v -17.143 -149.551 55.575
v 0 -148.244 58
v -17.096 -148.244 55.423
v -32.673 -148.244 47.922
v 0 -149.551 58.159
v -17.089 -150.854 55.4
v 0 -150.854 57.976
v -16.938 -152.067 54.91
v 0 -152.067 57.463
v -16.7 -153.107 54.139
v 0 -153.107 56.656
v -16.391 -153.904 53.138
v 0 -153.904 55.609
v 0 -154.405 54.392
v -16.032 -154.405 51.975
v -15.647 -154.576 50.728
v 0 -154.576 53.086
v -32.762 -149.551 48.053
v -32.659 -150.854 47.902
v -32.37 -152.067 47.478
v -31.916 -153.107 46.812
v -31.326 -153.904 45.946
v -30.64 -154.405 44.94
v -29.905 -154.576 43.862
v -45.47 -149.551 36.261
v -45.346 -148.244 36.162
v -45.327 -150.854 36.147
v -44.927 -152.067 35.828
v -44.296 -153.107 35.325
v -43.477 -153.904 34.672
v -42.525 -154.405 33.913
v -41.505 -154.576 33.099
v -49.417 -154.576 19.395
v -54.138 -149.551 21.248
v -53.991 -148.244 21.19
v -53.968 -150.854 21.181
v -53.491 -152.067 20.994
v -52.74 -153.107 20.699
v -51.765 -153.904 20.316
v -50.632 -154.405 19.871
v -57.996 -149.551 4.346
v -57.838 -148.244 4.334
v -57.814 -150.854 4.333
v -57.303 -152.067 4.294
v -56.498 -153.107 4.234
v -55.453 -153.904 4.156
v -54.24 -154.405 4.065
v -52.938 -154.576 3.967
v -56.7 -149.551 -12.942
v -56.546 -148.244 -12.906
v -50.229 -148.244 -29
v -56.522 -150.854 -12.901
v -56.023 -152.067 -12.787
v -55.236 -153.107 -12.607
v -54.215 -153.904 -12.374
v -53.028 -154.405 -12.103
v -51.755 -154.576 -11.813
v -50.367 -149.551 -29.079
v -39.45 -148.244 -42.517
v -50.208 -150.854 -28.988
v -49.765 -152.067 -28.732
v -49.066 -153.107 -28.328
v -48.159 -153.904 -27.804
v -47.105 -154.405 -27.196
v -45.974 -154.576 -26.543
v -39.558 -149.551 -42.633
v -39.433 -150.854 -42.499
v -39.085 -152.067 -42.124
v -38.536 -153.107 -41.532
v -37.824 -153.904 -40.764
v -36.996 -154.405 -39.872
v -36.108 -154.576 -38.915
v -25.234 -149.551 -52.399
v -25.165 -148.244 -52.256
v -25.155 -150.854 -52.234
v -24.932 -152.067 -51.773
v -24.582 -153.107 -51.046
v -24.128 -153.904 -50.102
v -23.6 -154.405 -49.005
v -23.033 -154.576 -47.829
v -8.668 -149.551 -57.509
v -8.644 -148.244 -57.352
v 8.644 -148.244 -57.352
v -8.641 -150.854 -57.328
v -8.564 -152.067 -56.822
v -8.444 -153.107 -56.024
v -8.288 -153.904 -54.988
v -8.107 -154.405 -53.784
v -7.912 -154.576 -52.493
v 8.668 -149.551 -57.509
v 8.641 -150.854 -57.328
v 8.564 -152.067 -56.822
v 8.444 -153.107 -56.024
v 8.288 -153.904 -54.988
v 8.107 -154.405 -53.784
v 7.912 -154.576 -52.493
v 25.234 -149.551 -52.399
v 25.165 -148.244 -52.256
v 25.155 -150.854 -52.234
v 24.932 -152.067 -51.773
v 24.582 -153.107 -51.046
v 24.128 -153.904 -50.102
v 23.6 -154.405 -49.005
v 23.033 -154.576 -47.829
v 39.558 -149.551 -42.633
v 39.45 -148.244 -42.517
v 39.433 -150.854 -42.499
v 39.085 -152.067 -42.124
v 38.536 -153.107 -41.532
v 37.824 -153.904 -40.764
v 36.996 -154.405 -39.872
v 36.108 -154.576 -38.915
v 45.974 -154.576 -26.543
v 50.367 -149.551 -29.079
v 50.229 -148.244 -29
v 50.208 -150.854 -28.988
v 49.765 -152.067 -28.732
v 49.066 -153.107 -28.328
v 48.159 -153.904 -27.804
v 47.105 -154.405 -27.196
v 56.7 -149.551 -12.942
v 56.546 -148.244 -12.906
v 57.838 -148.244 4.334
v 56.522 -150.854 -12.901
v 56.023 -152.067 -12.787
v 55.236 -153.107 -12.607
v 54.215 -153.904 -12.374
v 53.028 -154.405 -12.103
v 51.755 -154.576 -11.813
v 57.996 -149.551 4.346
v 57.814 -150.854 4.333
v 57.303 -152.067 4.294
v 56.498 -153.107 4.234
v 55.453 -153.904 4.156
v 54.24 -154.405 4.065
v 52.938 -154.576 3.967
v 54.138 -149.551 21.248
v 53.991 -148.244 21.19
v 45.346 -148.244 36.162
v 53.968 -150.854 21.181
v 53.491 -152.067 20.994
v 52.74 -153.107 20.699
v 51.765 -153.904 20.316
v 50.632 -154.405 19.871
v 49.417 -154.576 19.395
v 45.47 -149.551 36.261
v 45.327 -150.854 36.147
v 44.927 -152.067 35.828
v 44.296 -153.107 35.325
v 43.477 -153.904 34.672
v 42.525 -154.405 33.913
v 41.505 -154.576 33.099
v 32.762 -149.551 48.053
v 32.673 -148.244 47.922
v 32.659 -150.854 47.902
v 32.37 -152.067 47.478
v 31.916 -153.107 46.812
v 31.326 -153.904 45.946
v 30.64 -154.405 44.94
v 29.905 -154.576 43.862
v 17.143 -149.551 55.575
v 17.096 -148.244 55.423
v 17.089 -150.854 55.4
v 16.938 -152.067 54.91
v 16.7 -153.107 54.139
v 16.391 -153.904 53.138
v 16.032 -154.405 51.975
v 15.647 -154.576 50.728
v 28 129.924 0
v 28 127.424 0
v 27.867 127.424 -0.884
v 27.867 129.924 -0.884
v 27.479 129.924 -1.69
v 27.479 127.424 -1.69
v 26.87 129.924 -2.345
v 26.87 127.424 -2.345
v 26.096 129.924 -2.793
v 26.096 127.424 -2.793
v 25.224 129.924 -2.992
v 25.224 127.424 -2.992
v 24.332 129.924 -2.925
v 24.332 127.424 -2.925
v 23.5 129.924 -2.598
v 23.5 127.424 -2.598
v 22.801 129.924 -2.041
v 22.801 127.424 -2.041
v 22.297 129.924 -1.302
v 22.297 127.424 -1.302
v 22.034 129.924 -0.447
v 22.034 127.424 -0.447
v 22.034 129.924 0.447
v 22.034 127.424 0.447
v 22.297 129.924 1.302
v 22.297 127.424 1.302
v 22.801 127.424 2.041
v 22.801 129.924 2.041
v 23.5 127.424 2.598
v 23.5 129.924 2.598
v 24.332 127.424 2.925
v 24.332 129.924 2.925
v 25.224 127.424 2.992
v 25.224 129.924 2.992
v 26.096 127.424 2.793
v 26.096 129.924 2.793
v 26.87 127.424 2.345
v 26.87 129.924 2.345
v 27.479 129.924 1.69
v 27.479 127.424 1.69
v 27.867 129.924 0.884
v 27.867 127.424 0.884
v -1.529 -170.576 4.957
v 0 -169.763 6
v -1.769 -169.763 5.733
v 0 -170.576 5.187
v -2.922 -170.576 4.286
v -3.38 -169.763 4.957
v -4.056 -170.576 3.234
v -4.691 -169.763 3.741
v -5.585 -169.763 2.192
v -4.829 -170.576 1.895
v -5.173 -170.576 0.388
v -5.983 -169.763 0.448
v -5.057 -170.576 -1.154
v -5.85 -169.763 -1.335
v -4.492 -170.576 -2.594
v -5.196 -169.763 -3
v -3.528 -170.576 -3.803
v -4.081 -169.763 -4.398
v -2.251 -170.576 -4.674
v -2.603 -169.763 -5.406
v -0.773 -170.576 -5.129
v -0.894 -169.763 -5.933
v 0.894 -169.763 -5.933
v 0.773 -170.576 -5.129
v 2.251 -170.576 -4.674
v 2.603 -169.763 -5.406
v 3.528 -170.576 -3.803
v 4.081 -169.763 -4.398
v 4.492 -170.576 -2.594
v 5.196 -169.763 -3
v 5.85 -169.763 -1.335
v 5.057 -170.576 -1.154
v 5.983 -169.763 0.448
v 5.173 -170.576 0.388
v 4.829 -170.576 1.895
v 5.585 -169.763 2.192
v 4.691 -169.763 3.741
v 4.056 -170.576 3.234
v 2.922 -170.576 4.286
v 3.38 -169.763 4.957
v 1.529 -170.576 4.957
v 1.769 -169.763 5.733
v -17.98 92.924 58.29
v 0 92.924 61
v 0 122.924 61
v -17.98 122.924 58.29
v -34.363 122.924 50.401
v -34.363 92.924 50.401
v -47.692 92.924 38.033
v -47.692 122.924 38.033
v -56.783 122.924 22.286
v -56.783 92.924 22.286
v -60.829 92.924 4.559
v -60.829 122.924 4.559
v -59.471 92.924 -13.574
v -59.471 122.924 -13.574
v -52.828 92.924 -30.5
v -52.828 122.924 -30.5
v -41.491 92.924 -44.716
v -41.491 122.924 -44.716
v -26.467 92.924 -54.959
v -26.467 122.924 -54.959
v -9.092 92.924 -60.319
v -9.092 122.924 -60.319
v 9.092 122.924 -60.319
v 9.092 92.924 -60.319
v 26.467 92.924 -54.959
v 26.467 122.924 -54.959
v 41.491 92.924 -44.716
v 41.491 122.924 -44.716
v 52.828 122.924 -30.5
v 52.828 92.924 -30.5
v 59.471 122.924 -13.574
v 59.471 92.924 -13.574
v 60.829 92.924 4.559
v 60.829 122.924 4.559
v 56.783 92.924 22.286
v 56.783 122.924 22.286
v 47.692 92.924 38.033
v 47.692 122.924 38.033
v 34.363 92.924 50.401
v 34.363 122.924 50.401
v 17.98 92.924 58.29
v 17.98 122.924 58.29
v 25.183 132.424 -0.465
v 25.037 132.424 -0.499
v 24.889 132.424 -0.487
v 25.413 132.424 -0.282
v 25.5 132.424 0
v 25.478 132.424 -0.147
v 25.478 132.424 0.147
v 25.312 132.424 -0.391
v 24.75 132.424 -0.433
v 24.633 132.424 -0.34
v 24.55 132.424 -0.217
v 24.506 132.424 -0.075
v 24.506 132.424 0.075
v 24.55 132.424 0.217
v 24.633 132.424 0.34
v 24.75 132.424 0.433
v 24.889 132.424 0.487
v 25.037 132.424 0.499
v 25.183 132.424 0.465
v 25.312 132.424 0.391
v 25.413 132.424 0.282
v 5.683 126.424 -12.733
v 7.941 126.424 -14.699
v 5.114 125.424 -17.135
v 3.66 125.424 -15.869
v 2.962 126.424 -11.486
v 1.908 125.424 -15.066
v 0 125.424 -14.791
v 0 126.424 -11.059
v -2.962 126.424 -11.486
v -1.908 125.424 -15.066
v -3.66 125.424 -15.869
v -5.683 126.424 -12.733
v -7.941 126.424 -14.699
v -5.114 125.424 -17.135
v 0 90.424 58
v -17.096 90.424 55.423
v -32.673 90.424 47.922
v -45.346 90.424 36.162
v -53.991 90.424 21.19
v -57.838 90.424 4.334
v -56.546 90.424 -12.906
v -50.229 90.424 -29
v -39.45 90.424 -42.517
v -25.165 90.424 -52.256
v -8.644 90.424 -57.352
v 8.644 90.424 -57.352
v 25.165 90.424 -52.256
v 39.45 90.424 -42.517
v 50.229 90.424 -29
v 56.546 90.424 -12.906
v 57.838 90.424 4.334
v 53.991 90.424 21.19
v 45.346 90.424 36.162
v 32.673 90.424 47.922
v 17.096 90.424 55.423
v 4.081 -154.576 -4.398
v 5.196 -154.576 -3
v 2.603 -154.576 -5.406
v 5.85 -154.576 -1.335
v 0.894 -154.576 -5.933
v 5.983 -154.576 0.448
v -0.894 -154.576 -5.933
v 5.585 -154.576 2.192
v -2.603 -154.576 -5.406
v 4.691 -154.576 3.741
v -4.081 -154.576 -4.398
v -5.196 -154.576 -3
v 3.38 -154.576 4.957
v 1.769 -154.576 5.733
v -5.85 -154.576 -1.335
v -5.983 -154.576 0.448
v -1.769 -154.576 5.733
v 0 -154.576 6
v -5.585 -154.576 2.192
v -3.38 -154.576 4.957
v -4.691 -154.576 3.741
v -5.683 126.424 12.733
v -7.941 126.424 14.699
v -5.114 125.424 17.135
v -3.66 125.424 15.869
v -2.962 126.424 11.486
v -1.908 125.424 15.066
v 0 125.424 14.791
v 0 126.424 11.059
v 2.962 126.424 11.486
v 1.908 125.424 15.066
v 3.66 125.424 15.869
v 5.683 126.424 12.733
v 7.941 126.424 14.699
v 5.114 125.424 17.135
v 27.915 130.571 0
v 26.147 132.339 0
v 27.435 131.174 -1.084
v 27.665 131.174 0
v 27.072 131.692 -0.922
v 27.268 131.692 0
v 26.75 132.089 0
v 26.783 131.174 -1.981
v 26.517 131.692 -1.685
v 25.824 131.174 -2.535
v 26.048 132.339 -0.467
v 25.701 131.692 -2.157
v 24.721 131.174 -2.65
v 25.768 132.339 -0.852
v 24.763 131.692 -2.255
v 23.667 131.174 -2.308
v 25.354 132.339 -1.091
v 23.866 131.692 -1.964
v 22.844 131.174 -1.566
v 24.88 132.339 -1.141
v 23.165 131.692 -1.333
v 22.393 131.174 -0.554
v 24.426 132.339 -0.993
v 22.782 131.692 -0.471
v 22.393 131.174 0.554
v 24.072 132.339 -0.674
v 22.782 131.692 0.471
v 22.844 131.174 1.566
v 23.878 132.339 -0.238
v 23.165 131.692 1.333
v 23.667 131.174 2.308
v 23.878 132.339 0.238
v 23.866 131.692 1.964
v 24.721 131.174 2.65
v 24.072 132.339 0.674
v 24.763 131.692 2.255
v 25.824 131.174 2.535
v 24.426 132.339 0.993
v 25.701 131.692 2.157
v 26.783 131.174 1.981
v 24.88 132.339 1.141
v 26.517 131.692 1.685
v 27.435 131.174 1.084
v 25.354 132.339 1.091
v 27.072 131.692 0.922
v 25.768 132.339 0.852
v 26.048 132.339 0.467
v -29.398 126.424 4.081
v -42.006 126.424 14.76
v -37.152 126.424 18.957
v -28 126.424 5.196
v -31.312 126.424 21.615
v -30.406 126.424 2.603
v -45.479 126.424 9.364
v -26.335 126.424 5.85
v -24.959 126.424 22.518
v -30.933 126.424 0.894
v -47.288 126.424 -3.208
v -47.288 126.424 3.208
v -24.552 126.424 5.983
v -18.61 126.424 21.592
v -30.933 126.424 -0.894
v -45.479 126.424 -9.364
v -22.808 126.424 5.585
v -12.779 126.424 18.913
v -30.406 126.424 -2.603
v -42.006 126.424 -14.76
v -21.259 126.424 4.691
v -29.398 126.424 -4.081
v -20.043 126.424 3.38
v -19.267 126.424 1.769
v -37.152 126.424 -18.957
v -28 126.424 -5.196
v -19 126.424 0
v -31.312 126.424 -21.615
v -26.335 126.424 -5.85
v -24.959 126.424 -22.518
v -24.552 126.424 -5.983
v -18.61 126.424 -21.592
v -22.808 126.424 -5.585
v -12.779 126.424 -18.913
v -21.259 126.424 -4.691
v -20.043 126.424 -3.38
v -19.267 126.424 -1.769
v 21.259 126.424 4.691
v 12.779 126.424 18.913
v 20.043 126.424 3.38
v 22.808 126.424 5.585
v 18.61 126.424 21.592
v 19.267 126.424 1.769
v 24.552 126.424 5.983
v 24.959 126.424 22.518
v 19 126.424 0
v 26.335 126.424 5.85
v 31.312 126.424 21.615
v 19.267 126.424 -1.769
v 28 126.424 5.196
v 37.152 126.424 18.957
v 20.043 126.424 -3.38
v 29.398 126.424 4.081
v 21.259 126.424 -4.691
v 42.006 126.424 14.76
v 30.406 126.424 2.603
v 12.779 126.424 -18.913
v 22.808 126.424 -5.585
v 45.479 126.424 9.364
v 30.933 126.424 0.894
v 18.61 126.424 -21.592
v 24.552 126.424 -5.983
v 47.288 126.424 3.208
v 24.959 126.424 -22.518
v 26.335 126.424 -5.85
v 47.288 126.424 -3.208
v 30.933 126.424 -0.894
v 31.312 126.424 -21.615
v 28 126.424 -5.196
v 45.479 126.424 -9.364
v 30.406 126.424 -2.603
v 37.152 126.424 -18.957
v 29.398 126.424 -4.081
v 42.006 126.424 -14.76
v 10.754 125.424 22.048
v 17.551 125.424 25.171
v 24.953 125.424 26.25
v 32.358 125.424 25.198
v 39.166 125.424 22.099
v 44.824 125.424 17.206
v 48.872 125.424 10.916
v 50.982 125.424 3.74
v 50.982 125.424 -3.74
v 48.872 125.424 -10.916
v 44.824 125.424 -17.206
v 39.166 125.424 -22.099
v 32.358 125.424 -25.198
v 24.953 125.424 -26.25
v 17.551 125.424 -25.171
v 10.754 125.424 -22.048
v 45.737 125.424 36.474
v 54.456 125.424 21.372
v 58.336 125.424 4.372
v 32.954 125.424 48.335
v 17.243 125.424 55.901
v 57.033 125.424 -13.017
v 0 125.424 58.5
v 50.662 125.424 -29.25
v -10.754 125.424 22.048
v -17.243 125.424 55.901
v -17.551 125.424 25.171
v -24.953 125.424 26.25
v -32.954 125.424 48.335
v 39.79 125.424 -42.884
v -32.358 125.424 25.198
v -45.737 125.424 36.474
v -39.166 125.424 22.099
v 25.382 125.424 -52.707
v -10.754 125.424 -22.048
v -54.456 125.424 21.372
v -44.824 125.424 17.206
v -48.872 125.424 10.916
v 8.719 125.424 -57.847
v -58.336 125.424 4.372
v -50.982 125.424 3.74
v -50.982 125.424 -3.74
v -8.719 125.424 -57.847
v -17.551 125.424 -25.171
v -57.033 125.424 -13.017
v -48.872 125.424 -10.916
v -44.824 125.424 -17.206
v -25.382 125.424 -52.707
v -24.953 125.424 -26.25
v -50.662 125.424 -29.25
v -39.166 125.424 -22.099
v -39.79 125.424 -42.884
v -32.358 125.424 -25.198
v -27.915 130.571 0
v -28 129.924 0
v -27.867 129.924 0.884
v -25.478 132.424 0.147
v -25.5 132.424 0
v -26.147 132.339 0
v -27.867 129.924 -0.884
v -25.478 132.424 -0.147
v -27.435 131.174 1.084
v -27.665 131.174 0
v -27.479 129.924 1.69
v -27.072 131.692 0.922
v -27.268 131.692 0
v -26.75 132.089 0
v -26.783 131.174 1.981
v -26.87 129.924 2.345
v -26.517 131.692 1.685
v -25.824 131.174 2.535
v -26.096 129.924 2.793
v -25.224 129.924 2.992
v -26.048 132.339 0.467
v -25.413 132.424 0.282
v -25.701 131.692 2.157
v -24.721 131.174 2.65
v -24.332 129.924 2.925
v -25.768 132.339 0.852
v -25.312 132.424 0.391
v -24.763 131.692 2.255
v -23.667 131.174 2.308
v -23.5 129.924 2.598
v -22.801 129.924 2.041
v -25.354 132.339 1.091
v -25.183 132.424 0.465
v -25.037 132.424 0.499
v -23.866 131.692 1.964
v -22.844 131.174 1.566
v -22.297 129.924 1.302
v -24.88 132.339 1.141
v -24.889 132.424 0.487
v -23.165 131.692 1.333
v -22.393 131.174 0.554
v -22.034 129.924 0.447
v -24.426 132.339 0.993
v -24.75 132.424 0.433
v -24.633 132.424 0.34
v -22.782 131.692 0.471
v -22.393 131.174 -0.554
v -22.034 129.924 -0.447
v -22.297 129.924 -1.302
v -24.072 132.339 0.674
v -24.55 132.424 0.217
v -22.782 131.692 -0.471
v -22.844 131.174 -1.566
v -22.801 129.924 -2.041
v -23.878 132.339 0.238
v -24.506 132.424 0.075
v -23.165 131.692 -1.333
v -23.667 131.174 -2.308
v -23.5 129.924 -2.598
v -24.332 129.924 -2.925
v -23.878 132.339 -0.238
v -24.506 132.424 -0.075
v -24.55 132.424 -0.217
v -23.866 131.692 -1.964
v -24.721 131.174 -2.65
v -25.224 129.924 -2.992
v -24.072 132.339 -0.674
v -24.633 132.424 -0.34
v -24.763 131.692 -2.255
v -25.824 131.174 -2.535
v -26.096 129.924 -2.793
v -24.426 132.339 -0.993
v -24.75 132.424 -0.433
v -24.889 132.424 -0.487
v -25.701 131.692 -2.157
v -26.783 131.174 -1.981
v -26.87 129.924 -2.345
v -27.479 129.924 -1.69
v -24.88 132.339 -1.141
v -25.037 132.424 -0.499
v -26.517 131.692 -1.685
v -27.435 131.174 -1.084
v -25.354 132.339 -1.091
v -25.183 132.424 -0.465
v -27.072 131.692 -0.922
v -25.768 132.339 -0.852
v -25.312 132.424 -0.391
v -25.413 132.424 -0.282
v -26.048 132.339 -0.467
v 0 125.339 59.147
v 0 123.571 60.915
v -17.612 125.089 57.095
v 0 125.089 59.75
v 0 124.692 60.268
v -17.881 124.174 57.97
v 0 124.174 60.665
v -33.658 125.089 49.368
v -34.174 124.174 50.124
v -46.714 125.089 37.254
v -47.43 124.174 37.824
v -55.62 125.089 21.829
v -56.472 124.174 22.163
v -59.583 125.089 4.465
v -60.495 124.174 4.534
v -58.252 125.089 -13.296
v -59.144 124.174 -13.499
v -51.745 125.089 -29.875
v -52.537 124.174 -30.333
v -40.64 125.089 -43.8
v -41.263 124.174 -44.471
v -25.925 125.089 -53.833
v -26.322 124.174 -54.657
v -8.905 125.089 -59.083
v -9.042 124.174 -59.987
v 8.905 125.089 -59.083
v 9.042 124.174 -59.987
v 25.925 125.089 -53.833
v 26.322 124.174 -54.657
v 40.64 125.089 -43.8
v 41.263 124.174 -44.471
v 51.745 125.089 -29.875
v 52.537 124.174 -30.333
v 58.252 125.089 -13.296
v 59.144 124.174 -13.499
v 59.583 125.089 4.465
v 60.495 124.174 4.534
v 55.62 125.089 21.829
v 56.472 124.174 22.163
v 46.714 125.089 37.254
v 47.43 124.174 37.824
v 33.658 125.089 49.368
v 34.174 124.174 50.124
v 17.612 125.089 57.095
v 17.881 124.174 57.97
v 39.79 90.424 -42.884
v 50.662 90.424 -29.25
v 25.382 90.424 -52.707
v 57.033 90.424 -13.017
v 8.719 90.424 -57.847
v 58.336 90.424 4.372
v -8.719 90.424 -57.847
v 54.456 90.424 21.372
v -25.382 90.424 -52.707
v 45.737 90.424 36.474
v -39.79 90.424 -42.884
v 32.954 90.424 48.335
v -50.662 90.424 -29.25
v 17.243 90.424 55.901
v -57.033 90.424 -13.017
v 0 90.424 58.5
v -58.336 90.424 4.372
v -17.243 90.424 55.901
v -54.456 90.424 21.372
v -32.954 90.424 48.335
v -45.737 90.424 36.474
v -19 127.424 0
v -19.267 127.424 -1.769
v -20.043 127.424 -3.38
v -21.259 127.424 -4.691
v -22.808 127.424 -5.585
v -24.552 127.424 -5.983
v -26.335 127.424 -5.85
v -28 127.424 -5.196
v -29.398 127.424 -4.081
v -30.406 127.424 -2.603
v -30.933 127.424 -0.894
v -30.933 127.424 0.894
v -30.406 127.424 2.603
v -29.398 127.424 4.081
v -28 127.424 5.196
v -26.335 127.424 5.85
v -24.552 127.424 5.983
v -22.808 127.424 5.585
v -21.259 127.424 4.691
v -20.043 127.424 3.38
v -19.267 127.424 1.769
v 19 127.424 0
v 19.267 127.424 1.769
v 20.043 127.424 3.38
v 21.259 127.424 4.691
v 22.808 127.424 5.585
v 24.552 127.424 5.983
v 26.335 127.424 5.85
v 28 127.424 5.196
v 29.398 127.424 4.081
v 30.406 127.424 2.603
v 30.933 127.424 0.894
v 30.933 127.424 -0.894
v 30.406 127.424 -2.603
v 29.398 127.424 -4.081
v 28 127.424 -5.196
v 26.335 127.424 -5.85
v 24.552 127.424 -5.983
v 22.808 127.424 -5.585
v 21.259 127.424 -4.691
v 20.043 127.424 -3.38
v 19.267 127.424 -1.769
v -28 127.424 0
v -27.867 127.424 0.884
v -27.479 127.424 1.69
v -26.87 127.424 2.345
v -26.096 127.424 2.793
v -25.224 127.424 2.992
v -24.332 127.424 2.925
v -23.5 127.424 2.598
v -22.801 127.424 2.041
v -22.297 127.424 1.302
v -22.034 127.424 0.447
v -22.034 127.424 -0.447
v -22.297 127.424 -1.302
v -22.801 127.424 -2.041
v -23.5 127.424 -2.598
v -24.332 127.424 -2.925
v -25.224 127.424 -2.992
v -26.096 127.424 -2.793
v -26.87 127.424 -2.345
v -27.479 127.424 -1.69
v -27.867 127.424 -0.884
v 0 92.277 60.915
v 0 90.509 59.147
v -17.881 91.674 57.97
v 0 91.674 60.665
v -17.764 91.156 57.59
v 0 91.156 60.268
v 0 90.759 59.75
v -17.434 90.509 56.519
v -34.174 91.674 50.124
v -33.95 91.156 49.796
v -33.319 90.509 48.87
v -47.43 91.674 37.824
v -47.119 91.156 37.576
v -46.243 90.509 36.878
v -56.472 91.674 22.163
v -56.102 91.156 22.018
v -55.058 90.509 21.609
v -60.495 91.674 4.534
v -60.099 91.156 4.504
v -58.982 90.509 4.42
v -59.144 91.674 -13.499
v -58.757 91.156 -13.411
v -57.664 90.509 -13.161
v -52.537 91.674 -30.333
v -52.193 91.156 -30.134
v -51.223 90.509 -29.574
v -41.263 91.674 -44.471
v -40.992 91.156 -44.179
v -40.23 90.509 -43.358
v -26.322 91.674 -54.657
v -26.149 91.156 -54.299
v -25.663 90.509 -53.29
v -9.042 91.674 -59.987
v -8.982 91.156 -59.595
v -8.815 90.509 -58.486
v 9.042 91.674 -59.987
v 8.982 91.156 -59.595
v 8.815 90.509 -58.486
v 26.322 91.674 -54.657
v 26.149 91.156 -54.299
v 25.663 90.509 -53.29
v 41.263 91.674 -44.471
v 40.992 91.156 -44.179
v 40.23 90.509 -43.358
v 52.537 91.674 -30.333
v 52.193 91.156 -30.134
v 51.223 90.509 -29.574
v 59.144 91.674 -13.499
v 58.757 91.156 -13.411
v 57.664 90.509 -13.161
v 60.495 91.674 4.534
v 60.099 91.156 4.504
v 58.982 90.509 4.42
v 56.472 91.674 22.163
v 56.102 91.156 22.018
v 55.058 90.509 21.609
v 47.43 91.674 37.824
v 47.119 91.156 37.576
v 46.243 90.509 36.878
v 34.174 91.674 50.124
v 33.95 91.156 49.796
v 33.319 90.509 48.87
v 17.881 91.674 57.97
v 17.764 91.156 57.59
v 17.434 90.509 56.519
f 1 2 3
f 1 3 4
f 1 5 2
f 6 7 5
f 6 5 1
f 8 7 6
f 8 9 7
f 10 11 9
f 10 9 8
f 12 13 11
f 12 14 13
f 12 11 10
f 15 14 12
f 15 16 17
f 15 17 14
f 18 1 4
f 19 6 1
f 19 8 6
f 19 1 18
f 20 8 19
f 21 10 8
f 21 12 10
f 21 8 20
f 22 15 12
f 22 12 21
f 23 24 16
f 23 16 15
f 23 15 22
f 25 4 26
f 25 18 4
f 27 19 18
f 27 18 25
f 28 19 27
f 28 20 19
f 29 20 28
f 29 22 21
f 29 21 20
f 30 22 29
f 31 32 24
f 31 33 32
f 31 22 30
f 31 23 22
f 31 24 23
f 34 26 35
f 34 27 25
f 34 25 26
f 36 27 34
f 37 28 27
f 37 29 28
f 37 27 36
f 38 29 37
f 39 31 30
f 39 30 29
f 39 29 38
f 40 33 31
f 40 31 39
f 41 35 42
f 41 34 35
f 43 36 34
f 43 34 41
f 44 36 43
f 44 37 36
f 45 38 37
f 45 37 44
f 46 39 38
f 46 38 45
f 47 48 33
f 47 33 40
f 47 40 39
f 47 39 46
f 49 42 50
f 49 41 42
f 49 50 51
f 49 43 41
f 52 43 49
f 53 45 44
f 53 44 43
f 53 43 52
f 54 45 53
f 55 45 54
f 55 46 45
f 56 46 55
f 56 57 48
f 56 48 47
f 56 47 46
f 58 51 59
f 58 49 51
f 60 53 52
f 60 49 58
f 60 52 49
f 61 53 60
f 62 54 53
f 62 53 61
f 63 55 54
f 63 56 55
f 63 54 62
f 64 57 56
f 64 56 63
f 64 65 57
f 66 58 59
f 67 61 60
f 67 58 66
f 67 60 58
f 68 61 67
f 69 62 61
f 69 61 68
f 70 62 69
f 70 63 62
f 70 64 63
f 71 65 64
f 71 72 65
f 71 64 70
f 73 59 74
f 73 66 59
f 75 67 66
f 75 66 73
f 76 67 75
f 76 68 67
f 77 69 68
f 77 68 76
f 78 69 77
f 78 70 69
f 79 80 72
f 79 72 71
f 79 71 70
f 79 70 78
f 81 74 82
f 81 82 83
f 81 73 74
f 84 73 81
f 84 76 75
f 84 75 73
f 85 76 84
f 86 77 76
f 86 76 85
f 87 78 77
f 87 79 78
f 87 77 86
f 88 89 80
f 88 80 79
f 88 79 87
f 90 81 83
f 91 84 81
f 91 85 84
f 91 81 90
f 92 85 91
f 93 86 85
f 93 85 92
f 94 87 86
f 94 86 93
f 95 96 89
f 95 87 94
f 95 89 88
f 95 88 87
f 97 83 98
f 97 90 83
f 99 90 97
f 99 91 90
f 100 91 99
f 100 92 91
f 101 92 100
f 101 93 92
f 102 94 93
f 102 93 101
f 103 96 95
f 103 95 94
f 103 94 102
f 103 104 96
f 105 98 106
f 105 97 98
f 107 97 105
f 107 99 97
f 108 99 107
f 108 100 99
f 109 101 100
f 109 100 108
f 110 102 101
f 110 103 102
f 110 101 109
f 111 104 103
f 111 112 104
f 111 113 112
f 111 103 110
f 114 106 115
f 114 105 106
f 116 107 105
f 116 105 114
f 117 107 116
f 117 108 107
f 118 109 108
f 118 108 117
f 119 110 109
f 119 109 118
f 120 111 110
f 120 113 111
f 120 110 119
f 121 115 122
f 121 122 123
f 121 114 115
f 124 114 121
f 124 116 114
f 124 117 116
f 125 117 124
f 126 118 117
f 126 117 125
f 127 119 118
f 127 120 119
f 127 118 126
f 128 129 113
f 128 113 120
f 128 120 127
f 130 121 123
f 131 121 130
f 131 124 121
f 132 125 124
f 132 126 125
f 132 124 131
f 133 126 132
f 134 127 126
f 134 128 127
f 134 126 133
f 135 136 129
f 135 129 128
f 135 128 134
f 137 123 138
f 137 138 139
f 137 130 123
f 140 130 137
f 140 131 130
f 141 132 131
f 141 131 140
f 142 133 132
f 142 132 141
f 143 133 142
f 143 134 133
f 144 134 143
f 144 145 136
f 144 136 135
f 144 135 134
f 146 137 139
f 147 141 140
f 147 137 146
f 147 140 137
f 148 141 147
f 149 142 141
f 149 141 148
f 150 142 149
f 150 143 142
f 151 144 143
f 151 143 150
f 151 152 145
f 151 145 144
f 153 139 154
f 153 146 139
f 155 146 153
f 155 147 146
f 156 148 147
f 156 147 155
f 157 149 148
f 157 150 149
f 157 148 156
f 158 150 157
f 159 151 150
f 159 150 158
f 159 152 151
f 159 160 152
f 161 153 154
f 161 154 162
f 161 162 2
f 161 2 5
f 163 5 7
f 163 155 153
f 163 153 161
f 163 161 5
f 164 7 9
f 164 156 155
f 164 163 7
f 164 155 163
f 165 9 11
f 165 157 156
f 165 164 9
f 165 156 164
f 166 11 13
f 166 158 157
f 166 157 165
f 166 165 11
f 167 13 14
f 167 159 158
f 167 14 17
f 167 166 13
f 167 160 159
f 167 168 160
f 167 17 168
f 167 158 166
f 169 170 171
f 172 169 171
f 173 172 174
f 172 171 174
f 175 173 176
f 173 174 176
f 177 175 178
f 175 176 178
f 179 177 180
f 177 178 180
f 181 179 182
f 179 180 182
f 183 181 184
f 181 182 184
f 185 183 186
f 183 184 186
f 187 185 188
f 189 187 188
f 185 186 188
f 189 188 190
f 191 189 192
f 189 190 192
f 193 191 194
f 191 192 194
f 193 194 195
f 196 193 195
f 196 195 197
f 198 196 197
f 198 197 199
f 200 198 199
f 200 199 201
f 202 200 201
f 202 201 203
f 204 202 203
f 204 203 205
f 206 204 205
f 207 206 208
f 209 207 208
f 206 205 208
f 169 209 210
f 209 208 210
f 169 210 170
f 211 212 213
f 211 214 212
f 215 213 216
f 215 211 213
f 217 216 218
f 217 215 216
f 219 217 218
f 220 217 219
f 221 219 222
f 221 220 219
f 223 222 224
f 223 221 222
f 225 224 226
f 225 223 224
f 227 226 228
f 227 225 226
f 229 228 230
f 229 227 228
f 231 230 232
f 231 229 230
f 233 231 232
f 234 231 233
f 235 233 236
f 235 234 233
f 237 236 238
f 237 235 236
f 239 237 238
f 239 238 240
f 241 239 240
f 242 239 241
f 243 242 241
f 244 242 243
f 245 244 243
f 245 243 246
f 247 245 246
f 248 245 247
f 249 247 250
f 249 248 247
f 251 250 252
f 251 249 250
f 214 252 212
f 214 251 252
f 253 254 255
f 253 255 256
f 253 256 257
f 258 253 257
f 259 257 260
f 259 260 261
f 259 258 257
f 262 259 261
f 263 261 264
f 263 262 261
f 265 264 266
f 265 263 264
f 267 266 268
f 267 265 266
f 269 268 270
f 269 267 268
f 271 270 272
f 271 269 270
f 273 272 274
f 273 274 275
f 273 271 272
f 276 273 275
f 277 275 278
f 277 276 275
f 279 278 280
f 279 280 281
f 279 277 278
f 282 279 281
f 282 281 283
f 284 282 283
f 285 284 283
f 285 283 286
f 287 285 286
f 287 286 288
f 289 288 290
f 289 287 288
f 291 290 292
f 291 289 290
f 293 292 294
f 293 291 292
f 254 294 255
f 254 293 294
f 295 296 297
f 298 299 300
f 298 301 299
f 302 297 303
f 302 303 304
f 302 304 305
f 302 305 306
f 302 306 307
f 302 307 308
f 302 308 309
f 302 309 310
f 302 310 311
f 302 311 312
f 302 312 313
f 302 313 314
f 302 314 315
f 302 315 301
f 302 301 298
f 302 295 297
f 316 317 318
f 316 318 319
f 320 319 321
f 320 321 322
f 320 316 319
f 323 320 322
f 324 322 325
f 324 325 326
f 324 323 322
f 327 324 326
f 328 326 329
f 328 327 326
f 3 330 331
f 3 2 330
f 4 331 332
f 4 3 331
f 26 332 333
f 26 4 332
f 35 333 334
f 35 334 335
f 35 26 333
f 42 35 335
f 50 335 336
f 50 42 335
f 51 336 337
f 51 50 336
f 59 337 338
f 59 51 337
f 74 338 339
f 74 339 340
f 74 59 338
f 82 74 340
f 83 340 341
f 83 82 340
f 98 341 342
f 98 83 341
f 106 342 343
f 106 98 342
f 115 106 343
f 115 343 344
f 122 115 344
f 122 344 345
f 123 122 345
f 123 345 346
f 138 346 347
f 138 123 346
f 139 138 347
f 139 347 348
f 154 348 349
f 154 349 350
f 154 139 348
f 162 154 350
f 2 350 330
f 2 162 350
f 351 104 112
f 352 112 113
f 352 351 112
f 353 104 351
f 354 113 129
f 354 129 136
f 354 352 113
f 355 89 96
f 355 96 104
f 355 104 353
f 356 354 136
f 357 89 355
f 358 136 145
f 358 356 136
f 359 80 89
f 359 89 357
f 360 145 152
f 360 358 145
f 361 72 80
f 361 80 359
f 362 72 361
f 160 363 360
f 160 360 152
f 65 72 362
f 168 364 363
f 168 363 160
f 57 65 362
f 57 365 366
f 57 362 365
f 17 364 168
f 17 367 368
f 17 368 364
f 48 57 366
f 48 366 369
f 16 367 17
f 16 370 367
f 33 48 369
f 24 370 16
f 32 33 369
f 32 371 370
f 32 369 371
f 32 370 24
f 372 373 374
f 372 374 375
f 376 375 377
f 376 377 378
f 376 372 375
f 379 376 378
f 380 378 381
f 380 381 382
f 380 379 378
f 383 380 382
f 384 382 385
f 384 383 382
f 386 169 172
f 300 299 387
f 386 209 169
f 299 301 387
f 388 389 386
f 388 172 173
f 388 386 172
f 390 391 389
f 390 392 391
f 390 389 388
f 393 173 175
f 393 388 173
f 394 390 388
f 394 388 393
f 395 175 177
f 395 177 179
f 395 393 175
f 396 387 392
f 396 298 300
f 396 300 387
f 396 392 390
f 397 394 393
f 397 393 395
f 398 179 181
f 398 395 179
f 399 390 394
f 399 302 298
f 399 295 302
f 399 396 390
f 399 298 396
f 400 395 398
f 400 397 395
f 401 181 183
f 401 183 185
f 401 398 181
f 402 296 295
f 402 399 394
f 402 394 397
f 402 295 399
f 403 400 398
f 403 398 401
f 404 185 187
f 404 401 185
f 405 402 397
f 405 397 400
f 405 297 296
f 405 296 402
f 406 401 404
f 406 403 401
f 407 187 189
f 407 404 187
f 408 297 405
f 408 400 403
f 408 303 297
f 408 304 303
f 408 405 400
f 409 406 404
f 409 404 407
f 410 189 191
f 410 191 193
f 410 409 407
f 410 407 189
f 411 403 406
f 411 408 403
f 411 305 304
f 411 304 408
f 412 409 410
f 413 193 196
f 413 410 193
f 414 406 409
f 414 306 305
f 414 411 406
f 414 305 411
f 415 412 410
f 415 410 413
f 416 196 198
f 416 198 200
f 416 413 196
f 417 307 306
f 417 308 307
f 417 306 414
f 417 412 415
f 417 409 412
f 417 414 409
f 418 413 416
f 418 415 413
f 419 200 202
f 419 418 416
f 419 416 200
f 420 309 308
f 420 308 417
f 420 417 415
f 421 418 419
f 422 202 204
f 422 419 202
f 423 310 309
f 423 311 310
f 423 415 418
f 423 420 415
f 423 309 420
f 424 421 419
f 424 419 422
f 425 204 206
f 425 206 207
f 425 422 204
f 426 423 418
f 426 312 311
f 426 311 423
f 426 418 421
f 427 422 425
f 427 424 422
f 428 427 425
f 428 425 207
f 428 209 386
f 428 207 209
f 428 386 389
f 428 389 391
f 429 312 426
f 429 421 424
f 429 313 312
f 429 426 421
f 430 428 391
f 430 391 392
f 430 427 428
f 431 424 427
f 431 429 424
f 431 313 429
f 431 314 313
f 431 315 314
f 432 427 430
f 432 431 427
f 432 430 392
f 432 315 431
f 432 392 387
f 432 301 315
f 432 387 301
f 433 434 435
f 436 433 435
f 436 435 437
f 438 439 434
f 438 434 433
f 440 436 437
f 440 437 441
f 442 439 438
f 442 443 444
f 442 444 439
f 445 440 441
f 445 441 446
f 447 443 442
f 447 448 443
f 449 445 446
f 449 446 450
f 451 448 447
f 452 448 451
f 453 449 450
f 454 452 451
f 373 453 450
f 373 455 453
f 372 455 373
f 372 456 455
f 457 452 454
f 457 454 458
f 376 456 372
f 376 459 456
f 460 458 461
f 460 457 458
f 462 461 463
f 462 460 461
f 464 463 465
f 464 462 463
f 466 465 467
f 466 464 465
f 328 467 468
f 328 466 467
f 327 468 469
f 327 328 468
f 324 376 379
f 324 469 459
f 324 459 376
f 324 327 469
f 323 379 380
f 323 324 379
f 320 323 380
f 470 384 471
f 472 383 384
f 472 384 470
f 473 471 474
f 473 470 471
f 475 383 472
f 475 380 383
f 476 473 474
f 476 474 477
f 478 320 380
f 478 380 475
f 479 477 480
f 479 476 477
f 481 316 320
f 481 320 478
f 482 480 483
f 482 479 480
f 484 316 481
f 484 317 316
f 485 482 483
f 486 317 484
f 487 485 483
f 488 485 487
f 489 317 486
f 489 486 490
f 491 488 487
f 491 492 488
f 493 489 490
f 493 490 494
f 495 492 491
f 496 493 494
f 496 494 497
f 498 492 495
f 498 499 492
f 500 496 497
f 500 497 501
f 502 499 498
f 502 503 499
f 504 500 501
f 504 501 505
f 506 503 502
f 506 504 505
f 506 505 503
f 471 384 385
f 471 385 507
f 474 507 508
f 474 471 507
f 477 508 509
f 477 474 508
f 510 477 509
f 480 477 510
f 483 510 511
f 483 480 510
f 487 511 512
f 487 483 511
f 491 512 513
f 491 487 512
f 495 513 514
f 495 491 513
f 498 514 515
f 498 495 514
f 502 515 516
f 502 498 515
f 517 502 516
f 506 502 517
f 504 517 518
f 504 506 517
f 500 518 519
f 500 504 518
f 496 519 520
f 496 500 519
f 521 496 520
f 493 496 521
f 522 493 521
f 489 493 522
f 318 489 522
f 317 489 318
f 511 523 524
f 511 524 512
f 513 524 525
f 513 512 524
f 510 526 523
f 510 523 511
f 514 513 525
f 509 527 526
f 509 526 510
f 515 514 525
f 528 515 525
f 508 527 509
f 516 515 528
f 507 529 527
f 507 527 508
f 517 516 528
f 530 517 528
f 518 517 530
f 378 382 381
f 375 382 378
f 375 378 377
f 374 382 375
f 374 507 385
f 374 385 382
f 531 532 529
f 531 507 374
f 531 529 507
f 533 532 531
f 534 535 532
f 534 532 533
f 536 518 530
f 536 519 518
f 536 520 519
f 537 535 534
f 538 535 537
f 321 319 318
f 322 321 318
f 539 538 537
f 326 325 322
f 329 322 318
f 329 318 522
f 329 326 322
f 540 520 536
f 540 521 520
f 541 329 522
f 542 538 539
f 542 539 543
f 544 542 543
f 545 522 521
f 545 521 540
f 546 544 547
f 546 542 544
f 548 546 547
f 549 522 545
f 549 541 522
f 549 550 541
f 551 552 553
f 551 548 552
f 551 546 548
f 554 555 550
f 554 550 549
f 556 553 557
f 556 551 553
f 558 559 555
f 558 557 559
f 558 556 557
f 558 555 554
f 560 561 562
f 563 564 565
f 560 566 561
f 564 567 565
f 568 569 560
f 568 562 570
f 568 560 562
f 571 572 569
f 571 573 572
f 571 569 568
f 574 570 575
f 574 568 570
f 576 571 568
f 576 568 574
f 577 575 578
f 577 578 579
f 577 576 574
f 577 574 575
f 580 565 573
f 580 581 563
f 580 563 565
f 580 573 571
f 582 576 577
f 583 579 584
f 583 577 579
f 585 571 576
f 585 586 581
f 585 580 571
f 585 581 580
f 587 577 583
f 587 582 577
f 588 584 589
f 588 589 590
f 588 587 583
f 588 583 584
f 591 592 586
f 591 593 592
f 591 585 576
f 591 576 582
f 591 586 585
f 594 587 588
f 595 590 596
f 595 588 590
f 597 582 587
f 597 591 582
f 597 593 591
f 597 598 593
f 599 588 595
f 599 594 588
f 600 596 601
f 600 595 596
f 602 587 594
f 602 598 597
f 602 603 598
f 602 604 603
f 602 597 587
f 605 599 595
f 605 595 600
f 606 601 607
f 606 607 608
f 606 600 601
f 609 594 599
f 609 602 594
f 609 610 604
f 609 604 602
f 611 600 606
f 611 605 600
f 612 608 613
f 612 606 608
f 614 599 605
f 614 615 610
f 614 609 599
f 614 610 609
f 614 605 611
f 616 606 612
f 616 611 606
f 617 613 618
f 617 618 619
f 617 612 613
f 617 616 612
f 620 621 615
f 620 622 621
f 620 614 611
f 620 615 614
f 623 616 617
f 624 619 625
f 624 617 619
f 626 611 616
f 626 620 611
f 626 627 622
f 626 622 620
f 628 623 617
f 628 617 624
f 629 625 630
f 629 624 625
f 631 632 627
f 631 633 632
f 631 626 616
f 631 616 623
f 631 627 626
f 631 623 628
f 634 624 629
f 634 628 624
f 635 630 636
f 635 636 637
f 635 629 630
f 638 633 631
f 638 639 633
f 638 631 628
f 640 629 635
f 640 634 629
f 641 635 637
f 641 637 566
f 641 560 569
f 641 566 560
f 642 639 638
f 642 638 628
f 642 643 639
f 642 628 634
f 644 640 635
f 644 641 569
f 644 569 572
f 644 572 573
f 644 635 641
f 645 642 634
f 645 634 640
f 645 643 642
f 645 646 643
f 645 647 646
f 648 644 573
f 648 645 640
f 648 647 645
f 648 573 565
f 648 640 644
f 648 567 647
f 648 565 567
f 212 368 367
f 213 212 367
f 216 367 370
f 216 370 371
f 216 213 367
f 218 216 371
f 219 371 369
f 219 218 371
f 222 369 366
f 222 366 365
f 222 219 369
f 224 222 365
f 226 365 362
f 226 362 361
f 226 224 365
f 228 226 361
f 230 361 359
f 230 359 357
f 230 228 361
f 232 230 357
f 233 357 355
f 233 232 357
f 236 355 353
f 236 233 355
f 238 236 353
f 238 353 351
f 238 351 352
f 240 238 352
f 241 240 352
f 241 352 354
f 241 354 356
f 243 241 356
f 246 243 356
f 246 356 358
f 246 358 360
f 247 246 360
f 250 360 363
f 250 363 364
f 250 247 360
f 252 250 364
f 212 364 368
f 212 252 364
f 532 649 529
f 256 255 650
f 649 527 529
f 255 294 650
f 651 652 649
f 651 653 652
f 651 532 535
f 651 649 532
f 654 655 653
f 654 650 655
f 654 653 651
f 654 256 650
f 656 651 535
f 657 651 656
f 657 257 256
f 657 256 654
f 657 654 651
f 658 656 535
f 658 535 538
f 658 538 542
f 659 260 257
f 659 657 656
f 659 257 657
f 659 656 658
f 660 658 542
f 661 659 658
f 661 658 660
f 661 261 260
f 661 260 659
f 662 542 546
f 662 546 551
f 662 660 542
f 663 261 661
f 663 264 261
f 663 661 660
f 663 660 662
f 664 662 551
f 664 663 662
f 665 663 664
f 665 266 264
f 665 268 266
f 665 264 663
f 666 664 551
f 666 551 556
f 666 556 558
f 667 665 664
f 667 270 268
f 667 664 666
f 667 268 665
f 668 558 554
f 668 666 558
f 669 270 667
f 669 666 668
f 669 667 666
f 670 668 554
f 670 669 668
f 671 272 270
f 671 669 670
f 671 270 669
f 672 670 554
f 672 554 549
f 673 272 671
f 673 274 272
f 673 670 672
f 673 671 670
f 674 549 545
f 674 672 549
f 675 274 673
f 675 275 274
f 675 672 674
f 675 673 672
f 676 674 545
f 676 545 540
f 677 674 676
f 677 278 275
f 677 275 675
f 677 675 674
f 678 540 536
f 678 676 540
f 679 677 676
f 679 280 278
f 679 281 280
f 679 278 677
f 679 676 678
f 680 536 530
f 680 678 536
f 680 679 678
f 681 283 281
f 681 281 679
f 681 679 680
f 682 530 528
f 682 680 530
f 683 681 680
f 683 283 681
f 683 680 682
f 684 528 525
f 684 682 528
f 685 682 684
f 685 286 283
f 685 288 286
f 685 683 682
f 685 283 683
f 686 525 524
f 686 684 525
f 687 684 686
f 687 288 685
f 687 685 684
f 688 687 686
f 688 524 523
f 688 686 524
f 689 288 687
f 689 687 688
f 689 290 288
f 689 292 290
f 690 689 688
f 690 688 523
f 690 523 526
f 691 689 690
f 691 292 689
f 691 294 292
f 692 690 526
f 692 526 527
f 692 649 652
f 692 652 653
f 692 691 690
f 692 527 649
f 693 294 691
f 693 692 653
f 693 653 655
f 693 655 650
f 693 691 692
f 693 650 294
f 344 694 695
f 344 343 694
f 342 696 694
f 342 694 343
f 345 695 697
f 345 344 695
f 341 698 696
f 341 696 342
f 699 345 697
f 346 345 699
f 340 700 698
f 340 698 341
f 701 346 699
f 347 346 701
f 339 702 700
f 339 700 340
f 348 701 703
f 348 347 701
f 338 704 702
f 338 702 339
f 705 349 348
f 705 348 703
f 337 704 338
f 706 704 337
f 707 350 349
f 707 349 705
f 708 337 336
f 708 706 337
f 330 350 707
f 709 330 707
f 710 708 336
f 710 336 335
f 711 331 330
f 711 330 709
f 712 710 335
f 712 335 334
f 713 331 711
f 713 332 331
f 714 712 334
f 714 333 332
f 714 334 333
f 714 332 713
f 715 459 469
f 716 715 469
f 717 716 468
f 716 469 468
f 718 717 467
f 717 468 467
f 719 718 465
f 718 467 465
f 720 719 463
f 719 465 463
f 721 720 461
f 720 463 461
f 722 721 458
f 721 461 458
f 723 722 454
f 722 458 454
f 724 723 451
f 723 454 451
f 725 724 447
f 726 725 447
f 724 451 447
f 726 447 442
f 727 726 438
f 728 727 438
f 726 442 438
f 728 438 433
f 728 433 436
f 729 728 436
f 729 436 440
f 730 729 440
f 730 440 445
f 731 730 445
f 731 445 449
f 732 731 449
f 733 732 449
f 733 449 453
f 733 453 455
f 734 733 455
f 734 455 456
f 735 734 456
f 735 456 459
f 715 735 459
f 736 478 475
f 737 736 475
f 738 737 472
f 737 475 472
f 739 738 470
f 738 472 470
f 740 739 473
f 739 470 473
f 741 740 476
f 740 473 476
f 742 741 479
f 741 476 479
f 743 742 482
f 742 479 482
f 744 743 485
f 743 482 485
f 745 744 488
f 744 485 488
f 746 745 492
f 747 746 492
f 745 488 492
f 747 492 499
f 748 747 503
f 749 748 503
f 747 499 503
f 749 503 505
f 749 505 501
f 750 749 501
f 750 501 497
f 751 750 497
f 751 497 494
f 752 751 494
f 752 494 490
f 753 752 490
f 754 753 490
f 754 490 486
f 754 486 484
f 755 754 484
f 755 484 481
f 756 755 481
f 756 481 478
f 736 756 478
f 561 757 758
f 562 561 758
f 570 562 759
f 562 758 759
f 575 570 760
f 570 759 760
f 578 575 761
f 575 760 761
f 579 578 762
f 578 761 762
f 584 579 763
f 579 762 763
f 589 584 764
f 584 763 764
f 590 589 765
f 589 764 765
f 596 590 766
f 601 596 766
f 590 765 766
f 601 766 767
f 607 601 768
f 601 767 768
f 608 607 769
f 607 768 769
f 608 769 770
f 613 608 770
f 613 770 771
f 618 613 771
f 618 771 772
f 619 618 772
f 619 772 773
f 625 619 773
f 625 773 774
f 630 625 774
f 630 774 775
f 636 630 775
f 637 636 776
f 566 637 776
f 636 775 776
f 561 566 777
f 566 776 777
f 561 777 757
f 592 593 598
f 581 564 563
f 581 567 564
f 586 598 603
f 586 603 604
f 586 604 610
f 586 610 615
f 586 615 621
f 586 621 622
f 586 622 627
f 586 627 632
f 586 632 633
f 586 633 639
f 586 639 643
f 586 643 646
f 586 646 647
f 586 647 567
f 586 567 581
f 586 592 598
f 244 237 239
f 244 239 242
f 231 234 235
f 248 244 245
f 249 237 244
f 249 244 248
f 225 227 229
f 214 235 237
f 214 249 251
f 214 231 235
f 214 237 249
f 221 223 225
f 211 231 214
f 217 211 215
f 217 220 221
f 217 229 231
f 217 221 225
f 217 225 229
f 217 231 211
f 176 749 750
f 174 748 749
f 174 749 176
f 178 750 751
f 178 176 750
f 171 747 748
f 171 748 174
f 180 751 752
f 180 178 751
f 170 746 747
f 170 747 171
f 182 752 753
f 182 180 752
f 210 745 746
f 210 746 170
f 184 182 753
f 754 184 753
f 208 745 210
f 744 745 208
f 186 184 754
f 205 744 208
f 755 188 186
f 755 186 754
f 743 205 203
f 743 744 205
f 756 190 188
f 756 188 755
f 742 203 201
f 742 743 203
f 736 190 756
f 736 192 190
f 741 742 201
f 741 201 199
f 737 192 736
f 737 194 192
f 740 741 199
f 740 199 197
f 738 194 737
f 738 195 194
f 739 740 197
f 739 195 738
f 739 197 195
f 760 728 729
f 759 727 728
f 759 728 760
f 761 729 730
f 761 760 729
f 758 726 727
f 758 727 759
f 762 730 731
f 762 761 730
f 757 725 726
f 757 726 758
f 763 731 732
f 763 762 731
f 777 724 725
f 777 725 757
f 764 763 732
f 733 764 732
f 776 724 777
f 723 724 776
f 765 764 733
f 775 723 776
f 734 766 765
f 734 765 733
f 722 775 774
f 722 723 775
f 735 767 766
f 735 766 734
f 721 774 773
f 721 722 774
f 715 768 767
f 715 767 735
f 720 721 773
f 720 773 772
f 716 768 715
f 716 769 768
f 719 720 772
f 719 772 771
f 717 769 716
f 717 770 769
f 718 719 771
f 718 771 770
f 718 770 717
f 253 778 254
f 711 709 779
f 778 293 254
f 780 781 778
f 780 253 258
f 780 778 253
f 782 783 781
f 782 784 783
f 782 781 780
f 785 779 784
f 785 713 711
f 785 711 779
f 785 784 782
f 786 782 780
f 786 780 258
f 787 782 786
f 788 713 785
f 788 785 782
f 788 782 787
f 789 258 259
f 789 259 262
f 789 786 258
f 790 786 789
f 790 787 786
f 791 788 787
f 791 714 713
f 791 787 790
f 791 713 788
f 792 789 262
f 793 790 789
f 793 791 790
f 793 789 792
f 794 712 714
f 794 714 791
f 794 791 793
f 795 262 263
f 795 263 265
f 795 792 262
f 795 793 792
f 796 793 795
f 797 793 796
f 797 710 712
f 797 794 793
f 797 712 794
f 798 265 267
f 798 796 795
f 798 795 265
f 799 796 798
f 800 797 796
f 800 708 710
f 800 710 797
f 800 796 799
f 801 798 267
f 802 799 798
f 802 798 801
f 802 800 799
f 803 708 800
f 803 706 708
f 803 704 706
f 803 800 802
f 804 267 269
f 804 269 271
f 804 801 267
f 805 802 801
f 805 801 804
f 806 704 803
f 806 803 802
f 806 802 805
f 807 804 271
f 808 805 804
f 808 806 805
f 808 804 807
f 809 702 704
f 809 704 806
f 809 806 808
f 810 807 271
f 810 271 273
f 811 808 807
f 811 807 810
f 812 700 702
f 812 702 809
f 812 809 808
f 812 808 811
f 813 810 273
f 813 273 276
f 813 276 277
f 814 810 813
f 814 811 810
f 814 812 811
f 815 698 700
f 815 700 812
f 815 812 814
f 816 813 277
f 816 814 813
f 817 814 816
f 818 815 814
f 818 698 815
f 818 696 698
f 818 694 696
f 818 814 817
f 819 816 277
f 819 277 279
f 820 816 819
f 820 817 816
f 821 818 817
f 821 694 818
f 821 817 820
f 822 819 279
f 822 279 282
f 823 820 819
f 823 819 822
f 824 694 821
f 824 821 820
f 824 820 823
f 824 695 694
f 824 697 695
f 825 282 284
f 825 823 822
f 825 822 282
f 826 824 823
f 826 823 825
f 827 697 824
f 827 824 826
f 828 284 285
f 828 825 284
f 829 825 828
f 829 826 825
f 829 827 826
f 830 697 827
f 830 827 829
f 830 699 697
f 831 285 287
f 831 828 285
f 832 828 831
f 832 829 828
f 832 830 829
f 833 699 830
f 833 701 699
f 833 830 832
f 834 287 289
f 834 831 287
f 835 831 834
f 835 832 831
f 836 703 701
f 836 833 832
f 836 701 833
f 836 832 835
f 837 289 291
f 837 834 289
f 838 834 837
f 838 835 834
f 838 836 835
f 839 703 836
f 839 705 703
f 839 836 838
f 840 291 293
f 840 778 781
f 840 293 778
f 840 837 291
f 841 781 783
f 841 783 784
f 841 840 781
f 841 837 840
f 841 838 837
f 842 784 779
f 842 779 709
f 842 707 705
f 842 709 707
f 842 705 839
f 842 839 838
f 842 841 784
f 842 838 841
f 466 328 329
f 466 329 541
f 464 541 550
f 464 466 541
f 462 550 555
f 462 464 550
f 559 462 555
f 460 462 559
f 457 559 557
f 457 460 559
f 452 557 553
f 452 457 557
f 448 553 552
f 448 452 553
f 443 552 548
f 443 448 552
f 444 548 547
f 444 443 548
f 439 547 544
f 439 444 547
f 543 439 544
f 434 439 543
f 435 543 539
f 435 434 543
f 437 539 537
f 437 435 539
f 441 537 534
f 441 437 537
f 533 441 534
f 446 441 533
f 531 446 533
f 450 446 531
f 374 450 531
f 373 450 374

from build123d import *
from OCP.BRepFilletAPI import BRepFilletAPI_MakeChamfer

# Parameters (mm, degrees)
SKETCH2_R           = 6
BOSS_EXTRUDE1_DEPTH = 1
SKETCH3_R           = 6
BOSS_EXTRUDE2_DEPTH = 2
SKETCH4_R           = 3
BOSS_EXTRUDE3_DEPTH = 5
FILLET1_R           = 2.5
FILLET2_R           = 2.5
CHAMFER1_SIZE       = 1
CHAMFER1_SIZE_2     = 3.732050808


with BuildPart() as part:
    # Sketch1 → Revolve1 (revolve)
    with BuildSketch(Plane.XY, mode=Mode.PRIVATE) as revolve1_sk:
        with BuildLine():
            Line((0, 125.42410169), (61, 125.42410169))
            Line((61, 125.42410169), (61, 90.42410169))
            Line((61, 90.42410169), (58, 90.42410169))
            Line((58, 90.42410169), (58, -148.244074886))
            ThreePointArc((58, -148.244074886), (57.09375458, -152.613239536), (53.086404952, -154.57589831))
            Line((53.086404952, -154.57589831), (6, -154.57589831))
            Line((6, -154.57589831), (6, -169.763264473))
            Line((6, -169.763264473), (5.187366163, -170.57589831))
            Line((5.187366163, -170.57589831), (0, -170.57589831))
            Line((0, -170.57589831), (0, 125.42410169))
        make_face()
    revolve(revolve1_sk.sketch.rotate(Axis((0, 125.42410169, 0), (0, -1, 0)), 90), axis=Axis((0, 125.42410169, 0), (0, -1, 0)))

    # Sketch2 → Boss-Extrude1 (add)
    with BuildSketch(Plane(origin=(0, 125.42410169, 0), x_dir=(1, 0, 0), z_dir=(0, 1, 0))):
        with BuildLine():
            ThreePointArc((5.113636364, 17.134615295), (0, 14.790659229), (-5.113636364, 17.134615295))
            ThreePointArc((-5.113636364, 17.134615295), (-51.25, 0), (-5.113636364, -17.134615295))
            ThreePointArc((-5.113636364, -17.134615295), (0, -14.790659229), (5.113636364, -17.134615295))
            ThreePointArc((5.113636364, -17.134615295), (51.25, 0), (5.113636364, 17.134615295))
        make_face()
        with Locations(Location((25, 0, 0), (0, 0, 180))):
            Circle(SKETCH2_R, mode=Mode.SUBTRACT)
        with Locations((-25, 0)):
            Circle(SKETCH2_R, mode=Mode.SUBTRACT)
    extrude(amount=BOSS_EXTRUDE1_DEPTH)

    # Sketch3 → Boss-Extrude2 (add)
    with BuildSketch(Plane(origin=(0, 125.42410169, 0), x_dir=(1, 0, 0), z_dir=(0, 1, 0))):
        with Locations((-25, 0)):
            Circle(SKETCH3_R)
        with Locations(Location((25, 0, 0), (0, 0, 180))):
            Circle(SKETCH3_R)
    extrude(amount=BOSS_EXTRUDE2_DEPTH)

    # Sketch4 → Boss-Extrude3 (add)
    with BuildSketch(Plane(origin=(0, 127.42410169, 0), x_dir=(1, 0, 0), z_dir=(0, 1, 0))):
        with Locations((25, 0)):
            Circle(SKETCH4_R)
        with Locations(Location((-25, 0, 0), (0, 0, 180))):
            Circle(SKETCH4_R)
    extrude(amount=BOSS_EXTRUDE3_DEPTH)

    # Fillet1
    fillet1_edges = [part.edges().sort_by_distance(p)[0] for p in [
        (22, 132.42410169, 0),
        (-22, 132.42410169, 0),
    ]]
    fillet(fillet1_edges, radius=FILLET1_R)

    # Fillet2
    fillet2_edges = [part.edges().sort_by_distance(p)[0] for p in [
        (0, 90.42410169, -61),
        (0, 125.42410169, -61),
    ]]
    fillet(fillet2_edges, radius=FILLET2_R)

    # Chamfer1
    chamfer1_edges_1 = [part.edges().sort_by_distance(p)[0] for p in [
        (51.25, 126.42410169, 0),
    ]]
    chamfer1_side_1 = [part.faces().sort_by_distance(p)[0] for p in [
        (51.25, 126.40410169, 0),
    ]]
    chamfer1_edges_2 = [part.edges().sort_by_distance(p)[0] for p in [
        (0, 126.42410169, -14.790659229),
    ]]
    chamfer1_side_2 = [part.faces().sort_by_distance(p)[0] for p in [
        (0, 126.40410169, -14.790659229),
    ]]
    chamfer1_edges_3 = [part.edges().sort_by_distance(p)[0] for p in [
        (0, 126.42410169, 14.790659229),
    ]]
    chamfer1_side_3 = [part.faces().sort_by_distance(p)[0] for p in [
        (0, 126.40410169, 14.790659229),
    ]]
    chamfer1_edges_4 = [part.edges().sort_by_distance(p)[0] for p in [
        (-51.25, 126.42410169, 0),
    ]]
    chamfer1_side_4 = [part.faces().sort_by_distance(p)[0] for p in [
        (-51.25, 126.40410169, 0),
    ]]
    chamfer1 = BRepFilletAPI_MakeChamfer(part.part.solid().wrapped)
    for e in chamfer1_edges_1:
        chamfer1.Add(CHAMFER1_SIZE - 0.0001, CHAMFER1_SIZE_2 - 0.0001, e.wrapped, chamfer1_side_1[0].wrapped)
    for e in chamfer1_edges_2:
        chamfer1.Add(CHAMFER1_SIZE - 0.0001, CHAMFER1_SIZE_2 - 0.0001, e.wrapped, chamfer1_side_2[0].wrapped)
    for e in chamfer1_edges_3:
        chamfer1.Add(CHAMFER1_SIZE - 0.0001, CHAMFER1_SIZE_2 - 0.0001, e.wrapped, chamfer1_side_3[0].wrapped)
    for e in chamfer1_edges_4:
        chamfer1.Add(CHAMFER1_SIZE - 0.0001, CHAMFER1_SIZE_2 - 0.0001, e.wrapped, chamfer1_side_4[0].wrapped)
    add(Compound.cast(chamfer1.Shape()), mode=Mode.REPLACE)  # a hair under: the kernel refuses the full size


solid = part.part
